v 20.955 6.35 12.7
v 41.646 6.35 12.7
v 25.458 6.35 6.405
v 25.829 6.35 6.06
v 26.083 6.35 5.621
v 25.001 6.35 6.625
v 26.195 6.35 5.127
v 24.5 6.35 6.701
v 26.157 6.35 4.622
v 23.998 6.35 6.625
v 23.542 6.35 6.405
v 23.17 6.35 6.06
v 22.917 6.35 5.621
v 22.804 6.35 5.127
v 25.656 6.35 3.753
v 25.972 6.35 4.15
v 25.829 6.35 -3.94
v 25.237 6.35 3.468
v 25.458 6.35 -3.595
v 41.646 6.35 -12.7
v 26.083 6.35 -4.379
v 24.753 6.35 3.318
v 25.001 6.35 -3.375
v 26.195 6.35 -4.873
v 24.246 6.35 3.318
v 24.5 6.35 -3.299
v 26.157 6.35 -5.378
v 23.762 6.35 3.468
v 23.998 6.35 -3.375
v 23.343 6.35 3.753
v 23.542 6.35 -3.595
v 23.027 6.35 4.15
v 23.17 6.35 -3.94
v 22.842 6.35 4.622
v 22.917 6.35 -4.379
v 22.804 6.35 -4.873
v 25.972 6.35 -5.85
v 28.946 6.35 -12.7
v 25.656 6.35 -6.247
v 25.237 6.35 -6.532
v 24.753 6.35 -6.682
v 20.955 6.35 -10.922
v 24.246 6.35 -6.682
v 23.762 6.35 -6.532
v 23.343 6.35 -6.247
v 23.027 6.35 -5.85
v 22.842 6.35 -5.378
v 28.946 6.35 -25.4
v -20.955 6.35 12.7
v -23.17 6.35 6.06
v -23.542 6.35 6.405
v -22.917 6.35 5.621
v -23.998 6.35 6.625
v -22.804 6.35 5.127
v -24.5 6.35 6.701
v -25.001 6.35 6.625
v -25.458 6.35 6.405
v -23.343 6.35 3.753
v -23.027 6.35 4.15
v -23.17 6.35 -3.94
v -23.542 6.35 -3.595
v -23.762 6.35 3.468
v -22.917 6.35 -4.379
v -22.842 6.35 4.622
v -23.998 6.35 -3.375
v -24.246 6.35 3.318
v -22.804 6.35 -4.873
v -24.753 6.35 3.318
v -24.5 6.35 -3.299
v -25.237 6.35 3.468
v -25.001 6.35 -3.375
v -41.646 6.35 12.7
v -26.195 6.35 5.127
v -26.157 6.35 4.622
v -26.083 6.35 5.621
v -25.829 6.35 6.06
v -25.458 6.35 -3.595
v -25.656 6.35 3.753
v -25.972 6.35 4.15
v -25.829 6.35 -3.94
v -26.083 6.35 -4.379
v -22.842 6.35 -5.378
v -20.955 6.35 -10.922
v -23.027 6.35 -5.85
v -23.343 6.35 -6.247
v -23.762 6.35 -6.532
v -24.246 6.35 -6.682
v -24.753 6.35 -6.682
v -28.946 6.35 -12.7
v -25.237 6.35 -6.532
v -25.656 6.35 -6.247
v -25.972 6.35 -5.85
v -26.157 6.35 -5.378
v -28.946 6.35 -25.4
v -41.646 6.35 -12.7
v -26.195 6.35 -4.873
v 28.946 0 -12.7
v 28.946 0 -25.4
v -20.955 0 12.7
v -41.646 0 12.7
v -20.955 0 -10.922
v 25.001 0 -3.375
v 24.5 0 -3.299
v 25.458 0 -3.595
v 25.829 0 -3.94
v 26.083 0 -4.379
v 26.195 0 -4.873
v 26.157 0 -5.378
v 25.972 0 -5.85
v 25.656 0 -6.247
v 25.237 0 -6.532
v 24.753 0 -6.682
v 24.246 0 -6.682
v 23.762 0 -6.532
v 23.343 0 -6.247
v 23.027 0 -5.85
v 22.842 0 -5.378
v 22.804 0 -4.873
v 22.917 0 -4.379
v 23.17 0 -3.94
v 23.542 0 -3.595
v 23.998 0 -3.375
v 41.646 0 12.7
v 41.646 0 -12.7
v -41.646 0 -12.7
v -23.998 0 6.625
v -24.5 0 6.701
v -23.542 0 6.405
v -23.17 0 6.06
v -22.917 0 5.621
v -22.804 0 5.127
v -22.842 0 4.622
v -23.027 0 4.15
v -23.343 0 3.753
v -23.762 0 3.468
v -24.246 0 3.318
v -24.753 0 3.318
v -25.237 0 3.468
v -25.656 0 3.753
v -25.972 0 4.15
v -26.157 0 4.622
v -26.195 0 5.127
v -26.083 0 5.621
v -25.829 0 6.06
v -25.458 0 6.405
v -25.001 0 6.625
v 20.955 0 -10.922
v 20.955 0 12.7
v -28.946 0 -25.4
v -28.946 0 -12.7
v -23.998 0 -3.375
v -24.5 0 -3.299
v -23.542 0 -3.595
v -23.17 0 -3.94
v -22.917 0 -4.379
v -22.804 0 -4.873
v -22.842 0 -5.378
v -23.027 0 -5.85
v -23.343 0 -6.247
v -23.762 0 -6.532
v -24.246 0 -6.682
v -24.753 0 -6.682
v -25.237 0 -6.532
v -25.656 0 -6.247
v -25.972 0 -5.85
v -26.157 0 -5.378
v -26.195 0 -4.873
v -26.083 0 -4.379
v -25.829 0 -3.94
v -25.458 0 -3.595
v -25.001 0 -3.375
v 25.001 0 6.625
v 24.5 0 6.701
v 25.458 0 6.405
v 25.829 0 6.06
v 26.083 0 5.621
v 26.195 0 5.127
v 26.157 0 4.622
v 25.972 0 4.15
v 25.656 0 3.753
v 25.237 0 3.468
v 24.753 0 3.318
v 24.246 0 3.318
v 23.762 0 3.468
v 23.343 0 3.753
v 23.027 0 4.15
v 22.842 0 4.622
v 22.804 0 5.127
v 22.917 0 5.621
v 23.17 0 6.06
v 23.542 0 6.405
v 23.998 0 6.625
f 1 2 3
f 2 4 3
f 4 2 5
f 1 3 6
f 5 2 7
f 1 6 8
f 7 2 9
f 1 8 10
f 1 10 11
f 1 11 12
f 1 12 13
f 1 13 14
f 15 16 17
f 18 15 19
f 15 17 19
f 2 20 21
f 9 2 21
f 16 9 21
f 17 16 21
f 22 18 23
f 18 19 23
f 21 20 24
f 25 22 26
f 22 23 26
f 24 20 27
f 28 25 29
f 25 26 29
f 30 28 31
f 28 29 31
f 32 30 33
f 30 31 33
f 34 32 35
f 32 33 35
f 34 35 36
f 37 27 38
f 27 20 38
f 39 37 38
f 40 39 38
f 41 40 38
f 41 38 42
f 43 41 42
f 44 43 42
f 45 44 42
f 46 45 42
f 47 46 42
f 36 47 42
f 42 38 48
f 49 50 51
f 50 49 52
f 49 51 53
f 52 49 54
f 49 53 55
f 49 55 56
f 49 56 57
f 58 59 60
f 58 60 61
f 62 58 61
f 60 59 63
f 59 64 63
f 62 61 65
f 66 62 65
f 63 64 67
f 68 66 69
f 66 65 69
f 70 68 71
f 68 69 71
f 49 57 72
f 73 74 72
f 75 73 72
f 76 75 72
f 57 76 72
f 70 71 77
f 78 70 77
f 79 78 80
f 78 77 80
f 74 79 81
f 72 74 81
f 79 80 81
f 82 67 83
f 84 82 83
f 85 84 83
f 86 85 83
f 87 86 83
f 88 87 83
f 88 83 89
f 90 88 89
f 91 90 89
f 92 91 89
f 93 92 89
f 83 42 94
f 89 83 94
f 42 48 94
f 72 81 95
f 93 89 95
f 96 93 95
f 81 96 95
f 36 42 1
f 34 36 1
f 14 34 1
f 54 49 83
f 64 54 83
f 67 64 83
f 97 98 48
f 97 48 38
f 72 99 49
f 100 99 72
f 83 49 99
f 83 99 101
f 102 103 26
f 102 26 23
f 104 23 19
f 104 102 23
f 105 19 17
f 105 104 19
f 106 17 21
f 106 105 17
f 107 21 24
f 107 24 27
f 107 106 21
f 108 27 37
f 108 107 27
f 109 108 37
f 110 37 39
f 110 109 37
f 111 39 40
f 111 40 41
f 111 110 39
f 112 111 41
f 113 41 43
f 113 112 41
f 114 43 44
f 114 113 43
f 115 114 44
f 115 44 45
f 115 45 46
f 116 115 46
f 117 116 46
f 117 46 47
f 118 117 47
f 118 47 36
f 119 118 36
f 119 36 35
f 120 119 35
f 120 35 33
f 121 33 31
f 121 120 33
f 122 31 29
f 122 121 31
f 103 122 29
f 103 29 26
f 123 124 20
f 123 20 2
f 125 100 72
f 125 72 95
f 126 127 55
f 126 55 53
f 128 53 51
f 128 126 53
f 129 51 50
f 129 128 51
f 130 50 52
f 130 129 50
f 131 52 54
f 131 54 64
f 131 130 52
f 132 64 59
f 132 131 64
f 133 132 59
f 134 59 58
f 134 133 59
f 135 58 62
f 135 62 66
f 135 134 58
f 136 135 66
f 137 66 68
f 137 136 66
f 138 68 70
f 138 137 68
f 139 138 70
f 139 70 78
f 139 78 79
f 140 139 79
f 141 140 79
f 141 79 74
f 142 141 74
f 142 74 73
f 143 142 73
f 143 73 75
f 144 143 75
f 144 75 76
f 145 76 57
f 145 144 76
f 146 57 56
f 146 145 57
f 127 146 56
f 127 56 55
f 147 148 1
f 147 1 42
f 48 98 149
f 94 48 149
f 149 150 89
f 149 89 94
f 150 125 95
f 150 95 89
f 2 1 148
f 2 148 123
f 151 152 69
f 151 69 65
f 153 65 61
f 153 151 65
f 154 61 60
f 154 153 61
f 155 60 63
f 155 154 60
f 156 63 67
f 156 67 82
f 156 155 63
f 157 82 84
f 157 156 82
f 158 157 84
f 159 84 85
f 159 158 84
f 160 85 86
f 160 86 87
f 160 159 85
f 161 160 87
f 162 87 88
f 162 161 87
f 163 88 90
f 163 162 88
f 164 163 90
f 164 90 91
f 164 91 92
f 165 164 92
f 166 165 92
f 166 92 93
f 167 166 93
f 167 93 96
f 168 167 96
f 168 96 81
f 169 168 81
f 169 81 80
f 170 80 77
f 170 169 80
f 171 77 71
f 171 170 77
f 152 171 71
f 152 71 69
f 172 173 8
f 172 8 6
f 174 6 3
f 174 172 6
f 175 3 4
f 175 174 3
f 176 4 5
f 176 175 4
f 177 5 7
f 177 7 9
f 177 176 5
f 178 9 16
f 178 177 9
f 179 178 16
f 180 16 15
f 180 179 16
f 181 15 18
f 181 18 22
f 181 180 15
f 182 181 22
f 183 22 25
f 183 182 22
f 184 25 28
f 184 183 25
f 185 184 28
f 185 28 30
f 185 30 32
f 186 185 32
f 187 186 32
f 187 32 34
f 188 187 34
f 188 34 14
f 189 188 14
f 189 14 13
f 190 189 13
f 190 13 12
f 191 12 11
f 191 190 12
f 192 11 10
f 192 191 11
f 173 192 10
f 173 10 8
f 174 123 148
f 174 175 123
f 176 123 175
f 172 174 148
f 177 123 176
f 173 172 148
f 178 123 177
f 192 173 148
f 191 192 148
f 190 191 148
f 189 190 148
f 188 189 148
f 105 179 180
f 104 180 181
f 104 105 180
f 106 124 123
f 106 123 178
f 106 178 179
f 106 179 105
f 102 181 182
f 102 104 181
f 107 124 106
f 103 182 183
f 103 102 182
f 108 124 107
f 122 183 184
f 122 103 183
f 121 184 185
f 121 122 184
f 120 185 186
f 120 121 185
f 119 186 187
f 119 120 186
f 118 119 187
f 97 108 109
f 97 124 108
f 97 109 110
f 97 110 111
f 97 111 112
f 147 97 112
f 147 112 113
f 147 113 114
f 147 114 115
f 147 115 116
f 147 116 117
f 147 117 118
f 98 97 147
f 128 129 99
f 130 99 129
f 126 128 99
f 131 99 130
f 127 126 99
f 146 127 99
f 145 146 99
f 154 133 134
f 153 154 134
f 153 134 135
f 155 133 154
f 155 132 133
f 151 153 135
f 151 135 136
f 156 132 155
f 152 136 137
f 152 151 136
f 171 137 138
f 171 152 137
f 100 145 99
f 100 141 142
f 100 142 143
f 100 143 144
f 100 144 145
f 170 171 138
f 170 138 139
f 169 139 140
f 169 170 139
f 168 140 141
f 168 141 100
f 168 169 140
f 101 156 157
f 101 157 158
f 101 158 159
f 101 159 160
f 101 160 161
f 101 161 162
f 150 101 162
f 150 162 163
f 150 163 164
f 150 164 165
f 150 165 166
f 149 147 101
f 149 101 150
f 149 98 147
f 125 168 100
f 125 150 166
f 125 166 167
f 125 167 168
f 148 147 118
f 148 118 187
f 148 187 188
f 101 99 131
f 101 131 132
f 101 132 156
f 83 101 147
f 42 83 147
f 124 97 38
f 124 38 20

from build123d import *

# Parameters (mm, degrees)
SKETCH1_R           = 1.70053
SKETCH1_W           = 41.91
SKETCH1_H           = 21.844
BOSS_EXTRUDE1_DEPTH = 6.35
CUT_EXTRUDE1_DEPTH  = 50.192057177


with BuildPart() as part:
    # Sketch1 → Boss-Extrude1 (new body)
    with BuildSketch(Plane(origin=(0, 0, 0), x_dir=(1, 0, 0), z_dir=(0, 1, 0))):
        Polygon((-6.35, 25.4), (6.35, 25.4), (28.94584, 25.4), (28.94584, 12.7), (41.64584, 12.7), (41.64584, -12.7), (28.94584, -12.7), (28.94584, -25.4), (6.35, -25.4), (-6.35, -25.4), (-28.94584, -25.4), (-28.94584, -12.7), (-41.64584, -12.7), (-41.64584, 12.7), (-28.94584, 12.7), (-28.94584, 25.4), align=None)
        with Locations(Location((-24.49957, 5, 0), (0, 0, 270))):
            Circle(SKETCH1_R, mode=Mode.SUBTRACT)
        with Locations(Location((-24.49957, -5, 0), (0, 0, 270))):
            Circle(SKETCH1_R, mode=Mode.SUBTRACT)
        with Locations(Location((24.49957, -5, 0), (0, 0, 270))):
            Circle(SKETCH1_R, mode=Mode.SUBTRACT)
        with Locations(Location((24.49957, 5, 0), (0, 0, 270))):
            Circle(SKETCH1_R, mode=Mode.SUBTRACT)
        Rectangle(SKETCH1_W, SKETCH1_H, mode=Mode.SUBTRACT)
    extrude(amount=BOSS_EXTRUDE1_DEPTH)

    # Sketch2 → Cut-Extrude1 (cut, through all)
    with BuildSketch(Plane(origin=(0, 6.35, 0), x_dir=(1, 0, 0), z_dir=(0, 1, 0))):
        Polygon((-28.94584, -12.7), (-20.955, -12.7), (-20.955, -10.922), (20.955, -10.922), (20.955, -12.7), (28.94584, -12.7), (28.94584, -25.4), (-28.94584, -25.4), align=None)
    extrude(amount=-CUT_EXTRUDE1_DEPTH, mode=Mode.SUBTRACT)


solid = part.part
